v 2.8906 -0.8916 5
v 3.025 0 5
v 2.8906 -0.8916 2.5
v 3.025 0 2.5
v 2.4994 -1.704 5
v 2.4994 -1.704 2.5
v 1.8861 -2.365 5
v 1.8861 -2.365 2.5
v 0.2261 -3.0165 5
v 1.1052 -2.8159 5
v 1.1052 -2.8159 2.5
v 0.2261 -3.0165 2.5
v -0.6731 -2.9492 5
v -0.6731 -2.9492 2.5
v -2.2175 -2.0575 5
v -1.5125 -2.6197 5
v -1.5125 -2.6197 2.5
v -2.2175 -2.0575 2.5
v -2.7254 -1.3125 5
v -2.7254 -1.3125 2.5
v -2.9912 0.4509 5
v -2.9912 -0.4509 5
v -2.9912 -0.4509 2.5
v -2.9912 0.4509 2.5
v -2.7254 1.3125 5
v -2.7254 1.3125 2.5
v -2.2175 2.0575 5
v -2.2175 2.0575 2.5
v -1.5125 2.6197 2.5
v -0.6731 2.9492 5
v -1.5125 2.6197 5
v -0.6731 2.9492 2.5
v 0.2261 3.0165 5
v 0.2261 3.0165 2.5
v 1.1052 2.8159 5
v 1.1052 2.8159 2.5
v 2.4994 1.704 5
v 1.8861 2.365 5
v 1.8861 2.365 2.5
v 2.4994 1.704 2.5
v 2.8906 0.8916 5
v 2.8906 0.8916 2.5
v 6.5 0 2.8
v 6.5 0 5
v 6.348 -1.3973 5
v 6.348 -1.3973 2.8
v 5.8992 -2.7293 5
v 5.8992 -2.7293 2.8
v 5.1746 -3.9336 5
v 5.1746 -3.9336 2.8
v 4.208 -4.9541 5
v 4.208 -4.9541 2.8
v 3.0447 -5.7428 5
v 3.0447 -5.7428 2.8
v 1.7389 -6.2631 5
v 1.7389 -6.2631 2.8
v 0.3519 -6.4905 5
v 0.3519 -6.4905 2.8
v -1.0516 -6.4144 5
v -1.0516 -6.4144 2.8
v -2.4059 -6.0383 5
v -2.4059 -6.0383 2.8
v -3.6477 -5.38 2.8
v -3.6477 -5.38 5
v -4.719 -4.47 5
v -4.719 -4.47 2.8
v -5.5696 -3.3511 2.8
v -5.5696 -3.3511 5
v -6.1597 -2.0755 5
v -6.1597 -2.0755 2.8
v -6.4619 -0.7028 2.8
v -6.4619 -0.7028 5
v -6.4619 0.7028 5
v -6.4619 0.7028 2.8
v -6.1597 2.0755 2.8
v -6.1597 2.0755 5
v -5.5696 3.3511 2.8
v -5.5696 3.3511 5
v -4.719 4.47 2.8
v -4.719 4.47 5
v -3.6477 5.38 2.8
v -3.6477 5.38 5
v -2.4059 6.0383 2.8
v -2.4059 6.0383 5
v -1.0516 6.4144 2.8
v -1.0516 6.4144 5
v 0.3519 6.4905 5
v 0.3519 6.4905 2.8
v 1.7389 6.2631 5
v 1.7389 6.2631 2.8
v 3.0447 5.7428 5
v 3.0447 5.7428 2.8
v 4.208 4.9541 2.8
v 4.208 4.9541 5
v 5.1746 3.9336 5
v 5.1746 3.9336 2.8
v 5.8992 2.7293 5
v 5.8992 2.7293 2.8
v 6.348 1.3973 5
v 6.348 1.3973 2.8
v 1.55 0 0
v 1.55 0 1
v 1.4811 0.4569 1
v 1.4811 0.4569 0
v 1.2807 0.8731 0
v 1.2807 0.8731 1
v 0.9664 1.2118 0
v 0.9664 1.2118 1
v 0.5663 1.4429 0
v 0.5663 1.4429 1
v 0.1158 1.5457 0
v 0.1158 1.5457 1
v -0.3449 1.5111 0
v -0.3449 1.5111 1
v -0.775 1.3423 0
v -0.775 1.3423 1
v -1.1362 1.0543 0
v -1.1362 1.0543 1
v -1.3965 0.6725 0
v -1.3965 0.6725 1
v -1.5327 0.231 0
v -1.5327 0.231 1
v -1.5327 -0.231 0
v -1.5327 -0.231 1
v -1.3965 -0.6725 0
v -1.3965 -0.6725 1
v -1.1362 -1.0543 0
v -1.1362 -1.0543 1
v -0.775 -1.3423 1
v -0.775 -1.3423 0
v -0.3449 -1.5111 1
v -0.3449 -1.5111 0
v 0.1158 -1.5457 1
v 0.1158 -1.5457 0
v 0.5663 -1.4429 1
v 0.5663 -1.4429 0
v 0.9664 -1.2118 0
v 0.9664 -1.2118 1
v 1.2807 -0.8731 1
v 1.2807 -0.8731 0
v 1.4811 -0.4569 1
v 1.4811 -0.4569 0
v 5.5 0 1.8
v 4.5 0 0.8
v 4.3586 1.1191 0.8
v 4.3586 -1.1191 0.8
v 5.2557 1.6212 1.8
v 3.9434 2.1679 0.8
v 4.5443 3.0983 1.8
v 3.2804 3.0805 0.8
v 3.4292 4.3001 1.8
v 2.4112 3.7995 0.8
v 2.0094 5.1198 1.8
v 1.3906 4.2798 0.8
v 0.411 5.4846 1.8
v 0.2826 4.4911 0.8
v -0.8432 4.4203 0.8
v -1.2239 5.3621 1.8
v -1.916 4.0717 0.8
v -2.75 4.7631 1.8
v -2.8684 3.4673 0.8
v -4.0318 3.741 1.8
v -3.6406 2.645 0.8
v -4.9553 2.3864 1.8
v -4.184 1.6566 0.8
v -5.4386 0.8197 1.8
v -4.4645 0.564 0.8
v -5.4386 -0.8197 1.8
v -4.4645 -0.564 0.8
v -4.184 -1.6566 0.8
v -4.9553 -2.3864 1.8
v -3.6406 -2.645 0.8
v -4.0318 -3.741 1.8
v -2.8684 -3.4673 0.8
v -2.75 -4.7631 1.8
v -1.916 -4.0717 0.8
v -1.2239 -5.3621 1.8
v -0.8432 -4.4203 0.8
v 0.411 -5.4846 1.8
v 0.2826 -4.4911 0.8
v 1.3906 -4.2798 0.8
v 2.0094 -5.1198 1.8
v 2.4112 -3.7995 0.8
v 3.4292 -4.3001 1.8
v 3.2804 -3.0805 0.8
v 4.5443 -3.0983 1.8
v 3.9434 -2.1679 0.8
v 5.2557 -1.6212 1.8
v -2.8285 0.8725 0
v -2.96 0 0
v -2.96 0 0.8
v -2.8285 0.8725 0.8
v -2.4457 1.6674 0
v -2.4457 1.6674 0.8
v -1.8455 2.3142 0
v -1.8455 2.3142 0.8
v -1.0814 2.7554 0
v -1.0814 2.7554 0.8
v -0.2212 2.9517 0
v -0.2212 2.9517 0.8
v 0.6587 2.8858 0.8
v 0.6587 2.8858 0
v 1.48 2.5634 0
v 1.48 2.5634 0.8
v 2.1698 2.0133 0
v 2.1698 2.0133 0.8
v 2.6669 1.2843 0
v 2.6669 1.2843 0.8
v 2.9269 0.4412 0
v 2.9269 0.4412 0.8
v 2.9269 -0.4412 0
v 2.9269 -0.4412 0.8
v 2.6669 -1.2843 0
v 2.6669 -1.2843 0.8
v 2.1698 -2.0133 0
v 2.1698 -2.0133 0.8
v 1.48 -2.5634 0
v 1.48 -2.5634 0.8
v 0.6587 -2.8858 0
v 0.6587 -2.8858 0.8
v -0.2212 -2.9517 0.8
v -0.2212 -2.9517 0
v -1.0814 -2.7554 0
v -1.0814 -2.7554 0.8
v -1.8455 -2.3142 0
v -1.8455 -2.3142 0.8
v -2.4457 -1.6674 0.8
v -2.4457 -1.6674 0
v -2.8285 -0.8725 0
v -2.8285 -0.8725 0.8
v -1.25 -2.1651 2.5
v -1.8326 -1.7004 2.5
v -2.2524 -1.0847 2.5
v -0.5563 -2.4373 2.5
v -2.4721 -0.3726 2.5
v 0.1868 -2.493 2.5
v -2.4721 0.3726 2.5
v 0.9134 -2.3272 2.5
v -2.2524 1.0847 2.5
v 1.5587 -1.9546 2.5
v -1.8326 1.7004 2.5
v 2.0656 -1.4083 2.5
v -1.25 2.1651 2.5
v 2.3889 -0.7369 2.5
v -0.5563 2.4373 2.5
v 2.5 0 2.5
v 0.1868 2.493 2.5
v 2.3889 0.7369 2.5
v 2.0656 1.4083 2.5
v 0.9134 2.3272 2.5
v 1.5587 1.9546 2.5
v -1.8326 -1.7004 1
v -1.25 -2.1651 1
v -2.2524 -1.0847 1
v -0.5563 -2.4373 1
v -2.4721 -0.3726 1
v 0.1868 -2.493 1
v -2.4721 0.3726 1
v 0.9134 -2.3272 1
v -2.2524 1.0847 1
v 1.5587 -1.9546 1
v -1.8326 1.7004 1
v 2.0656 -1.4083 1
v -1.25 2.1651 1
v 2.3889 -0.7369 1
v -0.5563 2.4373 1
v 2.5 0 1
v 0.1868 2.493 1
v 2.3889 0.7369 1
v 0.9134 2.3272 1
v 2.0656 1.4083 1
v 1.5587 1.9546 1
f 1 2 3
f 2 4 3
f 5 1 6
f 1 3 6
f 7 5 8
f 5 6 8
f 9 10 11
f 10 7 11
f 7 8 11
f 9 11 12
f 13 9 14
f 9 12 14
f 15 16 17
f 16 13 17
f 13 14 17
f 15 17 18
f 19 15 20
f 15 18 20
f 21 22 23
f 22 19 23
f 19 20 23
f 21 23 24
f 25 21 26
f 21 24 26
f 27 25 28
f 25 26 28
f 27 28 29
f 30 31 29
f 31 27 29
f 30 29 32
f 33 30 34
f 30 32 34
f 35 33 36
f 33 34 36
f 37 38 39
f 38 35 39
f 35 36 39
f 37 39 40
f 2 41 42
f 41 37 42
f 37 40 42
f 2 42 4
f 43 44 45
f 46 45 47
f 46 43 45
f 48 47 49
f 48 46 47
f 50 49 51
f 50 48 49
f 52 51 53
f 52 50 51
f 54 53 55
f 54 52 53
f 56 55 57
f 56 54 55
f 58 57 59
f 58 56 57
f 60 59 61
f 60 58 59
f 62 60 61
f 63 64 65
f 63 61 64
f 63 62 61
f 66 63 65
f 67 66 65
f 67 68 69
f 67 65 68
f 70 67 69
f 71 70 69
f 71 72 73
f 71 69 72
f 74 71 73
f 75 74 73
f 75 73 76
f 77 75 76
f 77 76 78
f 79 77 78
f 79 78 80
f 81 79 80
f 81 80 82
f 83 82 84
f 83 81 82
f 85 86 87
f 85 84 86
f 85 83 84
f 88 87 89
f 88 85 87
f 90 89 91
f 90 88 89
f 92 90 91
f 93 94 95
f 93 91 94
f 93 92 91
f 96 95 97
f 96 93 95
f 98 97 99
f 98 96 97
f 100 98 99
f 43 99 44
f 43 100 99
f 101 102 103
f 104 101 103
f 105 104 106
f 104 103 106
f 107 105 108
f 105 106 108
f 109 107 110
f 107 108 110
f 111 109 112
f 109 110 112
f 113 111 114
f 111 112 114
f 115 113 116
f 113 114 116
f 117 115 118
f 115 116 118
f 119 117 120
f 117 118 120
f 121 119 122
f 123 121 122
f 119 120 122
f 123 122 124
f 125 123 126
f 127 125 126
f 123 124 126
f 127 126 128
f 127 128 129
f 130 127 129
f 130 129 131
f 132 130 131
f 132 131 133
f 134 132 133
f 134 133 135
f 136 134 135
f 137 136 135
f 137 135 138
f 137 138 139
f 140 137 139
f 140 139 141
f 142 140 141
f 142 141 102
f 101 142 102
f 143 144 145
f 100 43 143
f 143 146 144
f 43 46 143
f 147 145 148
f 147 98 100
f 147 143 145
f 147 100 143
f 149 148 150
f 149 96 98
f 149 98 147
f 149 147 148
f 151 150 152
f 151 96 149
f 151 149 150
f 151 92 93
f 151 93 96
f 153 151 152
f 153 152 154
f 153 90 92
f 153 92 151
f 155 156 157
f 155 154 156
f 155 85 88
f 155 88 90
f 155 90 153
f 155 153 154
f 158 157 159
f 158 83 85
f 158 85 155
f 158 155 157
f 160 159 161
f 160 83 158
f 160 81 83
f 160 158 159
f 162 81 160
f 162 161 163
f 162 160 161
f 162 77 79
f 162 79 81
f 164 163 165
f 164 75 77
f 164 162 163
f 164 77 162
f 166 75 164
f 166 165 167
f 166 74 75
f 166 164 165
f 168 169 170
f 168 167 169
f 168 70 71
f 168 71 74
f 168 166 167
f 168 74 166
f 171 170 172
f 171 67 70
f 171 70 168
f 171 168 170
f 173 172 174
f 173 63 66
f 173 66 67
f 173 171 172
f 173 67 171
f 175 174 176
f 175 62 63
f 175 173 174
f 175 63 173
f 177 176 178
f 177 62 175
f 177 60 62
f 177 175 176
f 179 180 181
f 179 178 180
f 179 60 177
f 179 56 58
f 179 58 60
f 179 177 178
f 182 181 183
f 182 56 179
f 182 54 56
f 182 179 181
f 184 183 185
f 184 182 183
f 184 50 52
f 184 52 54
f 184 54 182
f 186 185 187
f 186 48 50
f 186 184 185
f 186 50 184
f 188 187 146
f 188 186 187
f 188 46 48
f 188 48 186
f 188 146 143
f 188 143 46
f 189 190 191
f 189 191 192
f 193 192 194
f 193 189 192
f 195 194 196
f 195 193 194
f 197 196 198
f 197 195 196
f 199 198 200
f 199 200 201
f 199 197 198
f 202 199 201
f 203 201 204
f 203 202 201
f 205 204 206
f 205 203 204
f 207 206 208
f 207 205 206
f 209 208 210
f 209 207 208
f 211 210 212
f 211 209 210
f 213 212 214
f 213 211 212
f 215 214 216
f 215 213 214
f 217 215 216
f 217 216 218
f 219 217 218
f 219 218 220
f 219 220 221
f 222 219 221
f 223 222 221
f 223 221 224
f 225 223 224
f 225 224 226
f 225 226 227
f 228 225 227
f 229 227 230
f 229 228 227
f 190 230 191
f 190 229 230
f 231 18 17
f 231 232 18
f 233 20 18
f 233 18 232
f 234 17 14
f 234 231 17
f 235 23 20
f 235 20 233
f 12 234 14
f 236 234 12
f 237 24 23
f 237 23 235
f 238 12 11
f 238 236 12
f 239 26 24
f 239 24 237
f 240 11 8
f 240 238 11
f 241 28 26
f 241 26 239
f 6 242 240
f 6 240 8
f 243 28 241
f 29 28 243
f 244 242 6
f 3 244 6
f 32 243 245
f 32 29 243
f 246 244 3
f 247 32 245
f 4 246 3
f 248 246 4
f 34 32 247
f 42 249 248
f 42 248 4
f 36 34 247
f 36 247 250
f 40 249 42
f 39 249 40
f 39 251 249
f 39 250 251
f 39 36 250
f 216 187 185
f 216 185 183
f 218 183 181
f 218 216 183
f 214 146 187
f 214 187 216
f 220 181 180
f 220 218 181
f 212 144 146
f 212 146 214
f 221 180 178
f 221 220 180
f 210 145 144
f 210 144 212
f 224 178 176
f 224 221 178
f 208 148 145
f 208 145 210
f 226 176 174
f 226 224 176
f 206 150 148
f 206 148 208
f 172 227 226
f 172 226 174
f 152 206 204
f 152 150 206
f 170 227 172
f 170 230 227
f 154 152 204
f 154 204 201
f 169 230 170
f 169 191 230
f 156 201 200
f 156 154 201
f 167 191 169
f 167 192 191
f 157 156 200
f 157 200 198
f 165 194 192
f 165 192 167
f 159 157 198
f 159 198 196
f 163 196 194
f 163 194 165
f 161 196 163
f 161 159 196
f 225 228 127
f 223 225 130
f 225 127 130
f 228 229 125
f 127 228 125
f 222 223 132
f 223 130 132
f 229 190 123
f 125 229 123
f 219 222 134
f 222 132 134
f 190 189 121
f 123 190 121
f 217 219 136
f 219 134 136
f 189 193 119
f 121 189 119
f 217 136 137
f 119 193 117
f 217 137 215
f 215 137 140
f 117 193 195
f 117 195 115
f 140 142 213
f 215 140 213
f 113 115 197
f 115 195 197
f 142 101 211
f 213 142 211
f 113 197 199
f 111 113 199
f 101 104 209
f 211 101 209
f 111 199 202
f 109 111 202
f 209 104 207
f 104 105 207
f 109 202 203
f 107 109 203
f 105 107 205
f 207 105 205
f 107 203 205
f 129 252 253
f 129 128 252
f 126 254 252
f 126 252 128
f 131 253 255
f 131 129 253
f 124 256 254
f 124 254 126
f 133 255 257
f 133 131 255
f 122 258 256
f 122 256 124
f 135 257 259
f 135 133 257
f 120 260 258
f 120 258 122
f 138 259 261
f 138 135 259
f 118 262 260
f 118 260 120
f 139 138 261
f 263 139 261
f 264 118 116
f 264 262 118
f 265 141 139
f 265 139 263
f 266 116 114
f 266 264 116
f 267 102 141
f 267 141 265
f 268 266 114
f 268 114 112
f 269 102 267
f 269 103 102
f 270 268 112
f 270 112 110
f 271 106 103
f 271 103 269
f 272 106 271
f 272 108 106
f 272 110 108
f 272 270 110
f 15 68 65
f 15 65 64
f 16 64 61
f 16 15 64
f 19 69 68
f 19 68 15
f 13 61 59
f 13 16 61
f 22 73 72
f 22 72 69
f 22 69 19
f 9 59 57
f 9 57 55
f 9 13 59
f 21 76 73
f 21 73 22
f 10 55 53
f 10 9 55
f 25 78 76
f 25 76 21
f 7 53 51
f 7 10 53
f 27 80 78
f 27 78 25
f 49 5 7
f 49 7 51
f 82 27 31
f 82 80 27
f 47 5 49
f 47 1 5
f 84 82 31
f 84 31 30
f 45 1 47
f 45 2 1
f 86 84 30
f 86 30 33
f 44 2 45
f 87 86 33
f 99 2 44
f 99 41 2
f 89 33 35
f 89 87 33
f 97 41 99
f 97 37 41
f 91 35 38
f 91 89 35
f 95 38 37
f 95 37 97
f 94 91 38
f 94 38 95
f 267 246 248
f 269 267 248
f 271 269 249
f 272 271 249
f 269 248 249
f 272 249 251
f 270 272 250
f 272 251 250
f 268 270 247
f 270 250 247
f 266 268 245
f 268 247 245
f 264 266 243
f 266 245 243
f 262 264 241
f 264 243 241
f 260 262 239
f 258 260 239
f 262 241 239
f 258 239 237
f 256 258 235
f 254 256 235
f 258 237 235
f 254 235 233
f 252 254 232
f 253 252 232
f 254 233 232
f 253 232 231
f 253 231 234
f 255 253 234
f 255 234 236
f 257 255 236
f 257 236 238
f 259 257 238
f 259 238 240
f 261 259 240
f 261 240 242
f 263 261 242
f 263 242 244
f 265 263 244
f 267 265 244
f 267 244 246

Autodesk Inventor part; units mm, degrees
ref_plane "YZ Plane" through (0, 0, 0) normal (1, 0, 0) x (0, 1, 0)
ref_plane "XZ Plane" through (0, 0, 0) normal (0, 1, 0) x (-1, 0, 0)
ref_plane "XY Plane" through (0, 0, 0) normal (0, 0, 1) x (1, 0, 0)
sketch "Sketch1" plane through (0, 0, 0) normal (0, 0, 1) x (1, 0, 0)
  circle A0 centre (0, 0) radius 6.5
  dimension "d0" = 13
extrude "Extrusion1" add sketch "Sketch1" along normal blind 2.5
sketch "Sketch2" plane through (0, 0, 2.5) normal (0, 0, 1) x (1, 0, 0)
  circle A0 centre (0, 0) radius 1.55
  dimension "d3" = 3.1
extrude "Extrusion2" cut sketch "Sketch2" against normal through all
sketch "Sketch3" plane through (0, 0, 0) normal (0, 0, -1) x (-1, 0, 0)
  circle A0 centre (0, 0) radius 2.96
  circle A1 centre (0, 0) radius 7.5
  dimension "d6" = 5.92
  dimension "d16" = 15
extrude "Extrusion3" cut sketch "Sketch3" against normal blind 0.8
sketch "Sketch4" plane through (0, 0, 2.5) normal (0, 0, 1) x (1, 0, 0)
  circle A0 centre (0, 0) radius 2.5
  dimension "d9" = 5
extrude "Extrusion4" cut sketch "Sketch4" against normal blind 1.5
sketch "Sketch5" plane through (0, 0, 2.5) normal (0, 0, 1) x (1, 0, 0)
  circle A0 centre (0, 0) radius 6.5
  circle A1 centre (0, 0) radius 2.5 projected
  circle A2 centre (0, 0) radius 3.025
  circle A3 centre (0, 0) radius 6.5 projected
  dimension "d12" = 6.05
  dimension "d15" = 0
extrude "Extrusion5" add sketch "Sketch5" along normal blind 2.5 contours A0
chamfer "Chamfer1" distance 2 angle 45 1 edges at (-6.5, 0, 0.8)
properties part number "motor_and_magnet_holder"
